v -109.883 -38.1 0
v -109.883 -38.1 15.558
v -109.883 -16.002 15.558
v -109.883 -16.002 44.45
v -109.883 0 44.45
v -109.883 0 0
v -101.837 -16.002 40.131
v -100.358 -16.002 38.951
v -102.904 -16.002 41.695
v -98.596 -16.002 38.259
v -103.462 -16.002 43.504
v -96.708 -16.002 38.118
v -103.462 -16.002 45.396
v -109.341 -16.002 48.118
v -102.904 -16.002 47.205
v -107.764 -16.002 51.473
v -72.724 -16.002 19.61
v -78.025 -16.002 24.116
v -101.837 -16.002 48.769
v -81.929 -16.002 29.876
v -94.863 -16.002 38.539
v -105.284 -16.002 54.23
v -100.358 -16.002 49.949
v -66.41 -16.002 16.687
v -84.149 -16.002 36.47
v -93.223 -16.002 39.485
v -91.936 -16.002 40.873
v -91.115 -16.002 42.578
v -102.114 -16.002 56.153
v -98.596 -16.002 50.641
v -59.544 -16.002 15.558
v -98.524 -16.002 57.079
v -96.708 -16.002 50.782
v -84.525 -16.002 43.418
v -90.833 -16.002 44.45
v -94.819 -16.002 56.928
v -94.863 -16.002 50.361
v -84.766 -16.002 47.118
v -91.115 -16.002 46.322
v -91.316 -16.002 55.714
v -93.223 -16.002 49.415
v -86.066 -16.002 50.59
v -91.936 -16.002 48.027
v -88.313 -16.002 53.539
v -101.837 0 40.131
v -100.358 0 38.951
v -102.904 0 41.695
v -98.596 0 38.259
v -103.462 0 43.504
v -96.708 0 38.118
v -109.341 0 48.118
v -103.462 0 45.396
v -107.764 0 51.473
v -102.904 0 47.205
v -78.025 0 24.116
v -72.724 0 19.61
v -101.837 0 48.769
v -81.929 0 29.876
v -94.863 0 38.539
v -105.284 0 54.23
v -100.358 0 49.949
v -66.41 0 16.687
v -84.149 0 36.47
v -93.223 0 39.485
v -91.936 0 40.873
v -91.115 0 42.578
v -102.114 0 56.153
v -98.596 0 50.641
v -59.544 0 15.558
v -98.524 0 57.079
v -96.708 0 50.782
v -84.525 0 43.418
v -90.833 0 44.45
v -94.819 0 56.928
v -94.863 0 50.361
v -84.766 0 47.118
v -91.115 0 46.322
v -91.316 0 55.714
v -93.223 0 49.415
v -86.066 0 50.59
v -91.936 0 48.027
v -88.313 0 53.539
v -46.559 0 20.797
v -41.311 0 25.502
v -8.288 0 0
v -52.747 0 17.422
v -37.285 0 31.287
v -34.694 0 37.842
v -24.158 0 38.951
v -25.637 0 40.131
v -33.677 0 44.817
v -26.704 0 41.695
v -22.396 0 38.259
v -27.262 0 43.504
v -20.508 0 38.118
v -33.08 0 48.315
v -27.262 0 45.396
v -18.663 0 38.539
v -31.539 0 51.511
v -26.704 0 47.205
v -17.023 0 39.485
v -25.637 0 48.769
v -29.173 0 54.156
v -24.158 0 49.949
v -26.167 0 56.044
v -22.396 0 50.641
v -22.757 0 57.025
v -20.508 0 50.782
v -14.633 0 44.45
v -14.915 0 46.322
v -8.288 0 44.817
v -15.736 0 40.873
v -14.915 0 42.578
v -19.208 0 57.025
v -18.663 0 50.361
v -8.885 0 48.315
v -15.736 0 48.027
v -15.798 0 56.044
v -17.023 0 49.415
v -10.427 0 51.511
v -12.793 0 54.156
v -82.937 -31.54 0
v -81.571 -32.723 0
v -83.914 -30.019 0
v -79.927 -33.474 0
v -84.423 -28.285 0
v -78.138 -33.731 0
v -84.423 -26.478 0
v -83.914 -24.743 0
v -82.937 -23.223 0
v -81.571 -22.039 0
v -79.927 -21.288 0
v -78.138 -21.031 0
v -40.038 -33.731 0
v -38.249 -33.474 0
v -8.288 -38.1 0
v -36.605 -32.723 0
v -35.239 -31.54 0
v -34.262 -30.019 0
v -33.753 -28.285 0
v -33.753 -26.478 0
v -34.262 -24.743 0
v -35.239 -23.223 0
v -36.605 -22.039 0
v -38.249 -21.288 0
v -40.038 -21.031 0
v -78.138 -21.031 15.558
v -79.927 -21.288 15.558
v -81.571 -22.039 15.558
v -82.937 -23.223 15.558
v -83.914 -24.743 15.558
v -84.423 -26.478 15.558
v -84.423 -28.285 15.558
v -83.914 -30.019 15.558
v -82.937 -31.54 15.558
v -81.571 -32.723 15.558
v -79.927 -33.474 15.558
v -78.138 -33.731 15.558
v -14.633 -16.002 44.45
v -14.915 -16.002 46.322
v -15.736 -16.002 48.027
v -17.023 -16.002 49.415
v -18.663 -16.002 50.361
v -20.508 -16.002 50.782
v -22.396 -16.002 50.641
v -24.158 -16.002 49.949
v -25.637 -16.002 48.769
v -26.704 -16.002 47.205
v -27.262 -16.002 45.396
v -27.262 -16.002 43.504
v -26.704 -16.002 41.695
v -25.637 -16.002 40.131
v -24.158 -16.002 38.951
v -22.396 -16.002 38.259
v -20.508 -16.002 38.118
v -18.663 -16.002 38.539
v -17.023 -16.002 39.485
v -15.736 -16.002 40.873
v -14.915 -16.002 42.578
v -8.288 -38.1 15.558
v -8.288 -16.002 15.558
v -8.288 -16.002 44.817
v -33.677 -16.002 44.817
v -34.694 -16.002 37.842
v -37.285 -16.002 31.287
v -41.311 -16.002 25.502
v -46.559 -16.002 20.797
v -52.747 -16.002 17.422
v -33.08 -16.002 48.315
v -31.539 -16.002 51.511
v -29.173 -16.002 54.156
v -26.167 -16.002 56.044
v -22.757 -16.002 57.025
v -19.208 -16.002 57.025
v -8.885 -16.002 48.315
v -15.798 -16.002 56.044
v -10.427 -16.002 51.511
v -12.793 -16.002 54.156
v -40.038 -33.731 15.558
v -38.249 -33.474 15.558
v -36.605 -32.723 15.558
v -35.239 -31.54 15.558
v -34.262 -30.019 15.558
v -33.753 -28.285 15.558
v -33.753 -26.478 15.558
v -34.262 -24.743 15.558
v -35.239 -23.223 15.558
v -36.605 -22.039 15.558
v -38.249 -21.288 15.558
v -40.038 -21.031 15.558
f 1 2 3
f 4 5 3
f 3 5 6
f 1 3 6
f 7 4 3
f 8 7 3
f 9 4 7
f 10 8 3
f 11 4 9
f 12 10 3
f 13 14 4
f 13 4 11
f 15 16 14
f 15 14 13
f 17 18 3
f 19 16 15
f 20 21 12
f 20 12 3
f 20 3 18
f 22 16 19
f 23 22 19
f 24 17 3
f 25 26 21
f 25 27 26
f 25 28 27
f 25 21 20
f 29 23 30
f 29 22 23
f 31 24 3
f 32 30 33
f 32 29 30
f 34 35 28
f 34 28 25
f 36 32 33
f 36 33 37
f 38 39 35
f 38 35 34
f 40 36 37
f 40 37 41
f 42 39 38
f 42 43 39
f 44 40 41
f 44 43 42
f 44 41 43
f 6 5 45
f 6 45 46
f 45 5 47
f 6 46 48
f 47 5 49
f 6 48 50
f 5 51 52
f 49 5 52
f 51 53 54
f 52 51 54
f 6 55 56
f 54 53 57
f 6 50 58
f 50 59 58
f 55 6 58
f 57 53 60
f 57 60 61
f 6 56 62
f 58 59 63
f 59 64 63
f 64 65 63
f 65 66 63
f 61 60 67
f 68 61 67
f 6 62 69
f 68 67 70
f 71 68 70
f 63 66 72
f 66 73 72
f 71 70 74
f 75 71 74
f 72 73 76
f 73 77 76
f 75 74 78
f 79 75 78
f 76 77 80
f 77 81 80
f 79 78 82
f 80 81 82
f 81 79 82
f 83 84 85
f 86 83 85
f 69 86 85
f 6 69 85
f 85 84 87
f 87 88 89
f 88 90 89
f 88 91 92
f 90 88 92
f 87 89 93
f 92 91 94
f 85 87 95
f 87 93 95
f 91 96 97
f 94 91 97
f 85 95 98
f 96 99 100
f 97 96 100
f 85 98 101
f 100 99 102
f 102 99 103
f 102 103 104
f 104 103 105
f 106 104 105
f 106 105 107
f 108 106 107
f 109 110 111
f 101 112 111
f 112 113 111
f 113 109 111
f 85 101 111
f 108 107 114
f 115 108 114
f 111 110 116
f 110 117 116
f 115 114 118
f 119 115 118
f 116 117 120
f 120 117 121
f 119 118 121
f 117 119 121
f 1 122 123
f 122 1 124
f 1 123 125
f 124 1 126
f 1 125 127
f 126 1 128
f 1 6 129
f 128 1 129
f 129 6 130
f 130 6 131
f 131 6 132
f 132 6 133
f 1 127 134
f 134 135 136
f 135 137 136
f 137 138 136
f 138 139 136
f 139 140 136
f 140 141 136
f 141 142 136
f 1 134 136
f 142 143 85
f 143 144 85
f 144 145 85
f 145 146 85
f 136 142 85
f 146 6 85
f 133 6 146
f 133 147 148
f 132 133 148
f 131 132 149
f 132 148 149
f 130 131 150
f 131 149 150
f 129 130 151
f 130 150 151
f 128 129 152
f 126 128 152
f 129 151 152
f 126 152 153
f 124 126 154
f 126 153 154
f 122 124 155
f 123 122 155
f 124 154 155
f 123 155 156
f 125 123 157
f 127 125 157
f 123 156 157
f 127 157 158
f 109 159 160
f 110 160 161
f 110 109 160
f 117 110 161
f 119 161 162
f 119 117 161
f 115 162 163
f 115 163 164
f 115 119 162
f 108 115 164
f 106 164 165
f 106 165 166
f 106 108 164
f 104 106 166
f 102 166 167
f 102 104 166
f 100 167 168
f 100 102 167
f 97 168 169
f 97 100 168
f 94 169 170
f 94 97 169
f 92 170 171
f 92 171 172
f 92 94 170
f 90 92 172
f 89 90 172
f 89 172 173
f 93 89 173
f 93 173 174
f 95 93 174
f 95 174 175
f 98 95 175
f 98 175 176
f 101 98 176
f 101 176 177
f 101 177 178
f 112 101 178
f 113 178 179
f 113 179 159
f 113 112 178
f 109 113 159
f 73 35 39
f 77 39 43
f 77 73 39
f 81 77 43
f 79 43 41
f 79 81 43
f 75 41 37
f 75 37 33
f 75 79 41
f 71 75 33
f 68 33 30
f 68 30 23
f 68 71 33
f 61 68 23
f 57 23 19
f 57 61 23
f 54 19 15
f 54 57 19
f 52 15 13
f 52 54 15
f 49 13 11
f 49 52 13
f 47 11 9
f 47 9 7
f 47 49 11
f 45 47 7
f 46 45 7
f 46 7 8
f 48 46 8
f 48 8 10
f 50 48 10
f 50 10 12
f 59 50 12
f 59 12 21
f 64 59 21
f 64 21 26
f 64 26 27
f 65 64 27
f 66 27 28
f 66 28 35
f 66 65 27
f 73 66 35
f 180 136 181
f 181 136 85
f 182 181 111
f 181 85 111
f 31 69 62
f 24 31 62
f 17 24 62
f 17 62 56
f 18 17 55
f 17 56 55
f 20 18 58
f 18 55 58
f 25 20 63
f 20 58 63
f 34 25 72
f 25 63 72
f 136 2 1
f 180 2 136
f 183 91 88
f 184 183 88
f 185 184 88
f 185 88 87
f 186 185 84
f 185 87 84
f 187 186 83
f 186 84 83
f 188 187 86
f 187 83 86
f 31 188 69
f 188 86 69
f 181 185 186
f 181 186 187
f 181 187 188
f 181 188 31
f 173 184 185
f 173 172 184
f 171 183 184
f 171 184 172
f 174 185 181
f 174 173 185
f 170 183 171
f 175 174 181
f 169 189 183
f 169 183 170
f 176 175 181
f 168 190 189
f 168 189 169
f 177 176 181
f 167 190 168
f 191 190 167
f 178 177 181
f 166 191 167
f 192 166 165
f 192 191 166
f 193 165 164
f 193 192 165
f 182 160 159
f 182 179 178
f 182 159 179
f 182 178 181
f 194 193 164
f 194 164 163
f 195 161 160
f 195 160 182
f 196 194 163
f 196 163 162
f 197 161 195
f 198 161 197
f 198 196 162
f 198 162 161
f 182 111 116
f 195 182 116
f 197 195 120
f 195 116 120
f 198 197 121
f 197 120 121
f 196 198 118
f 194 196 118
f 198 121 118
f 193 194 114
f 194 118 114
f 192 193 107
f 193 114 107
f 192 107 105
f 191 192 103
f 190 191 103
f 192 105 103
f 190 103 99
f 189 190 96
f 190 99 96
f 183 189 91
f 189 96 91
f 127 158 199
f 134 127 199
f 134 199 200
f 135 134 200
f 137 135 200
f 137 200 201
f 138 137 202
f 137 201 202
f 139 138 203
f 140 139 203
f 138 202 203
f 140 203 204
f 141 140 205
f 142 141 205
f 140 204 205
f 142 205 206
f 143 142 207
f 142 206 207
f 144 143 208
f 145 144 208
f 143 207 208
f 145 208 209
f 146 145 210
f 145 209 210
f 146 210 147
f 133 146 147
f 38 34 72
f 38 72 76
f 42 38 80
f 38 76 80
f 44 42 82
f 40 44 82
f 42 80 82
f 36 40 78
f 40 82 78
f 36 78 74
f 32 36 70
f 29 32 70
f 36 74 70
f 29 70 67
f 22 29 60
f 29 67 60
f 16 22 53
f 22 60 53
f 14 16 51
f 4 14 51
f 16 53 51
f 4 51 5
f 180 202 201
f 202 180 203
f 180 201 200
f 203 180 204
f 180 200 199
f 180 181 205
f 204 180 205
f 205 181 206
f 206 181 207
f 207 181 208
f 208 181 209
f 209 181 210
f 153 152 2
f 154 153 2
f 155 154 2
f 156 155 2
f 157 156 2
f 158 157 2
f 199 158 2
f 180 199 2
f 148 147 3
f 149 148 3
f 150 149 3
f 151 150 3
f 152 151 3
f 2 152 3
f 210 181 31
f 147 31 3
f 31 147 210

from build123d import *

# Parameters (mm, degrees)
F0_R     = 6.35
F1_DEPTH = 16.002
F2_DEPTH = 38.1
F4_DEPTH = 25.4


with BuildPart() as f1:
    # F0 (on Front) → F1 (new body)
    with BuildSketch(Plane.XZ):
        with BuildLine():
            Line((-109.882609, 44.45), (-109.882609, 15.558309))
            Line((-109.882609, 15.558309), (-59.544396, 15.558309))
            ThreePointArc((-59.544396, 15.558309), (-78.025435, 24.116231), (-84.524632, 43.417714))
            ThreePointArc((-84.524632, 43.417714), (-96.666039, 57.13949), (-109.882609, 44.45))
        make_face()
        with Locations((-97.182609, 44.45)):
            Circle(F0_R, mode=Mode.SUBTRACT)
        with BuildLine():
            Line((-59.544396, 15.558309), (-8.287901, 15.558309))
            Line((-8.287901, 15.558309), (-8.287901, 44.816575))
            ThreePointArc((-8.287901, 44.816575), (-20.982609, 57.15), (-33.677318, 44.816575))
            ThreePointArc((-33.677318, 44.816575), (-41.311473, 25.502285), (-59.544396, 15.558309))
        make_face()
        with Locations((-20.982609, 44.45)):
            Circle(F0_R, mode=Mode.SUBTRACT)
    extrude(amount=F1_DEPTH)

    # F0 (on Front) → F2 (join)
    with BuildSketch(Plane.XZ):
        Polygon((-109.882609, 15.558309), (-109.882609, 0), (-8.287901, 0), (-8.287901, 15.558309), (-59.544396, 15.558309), align=None)
    extrude(amount=F2_DEPTH)

    # F3 (on face) → F4 (cut)
    with BuildSketch(Plane.XY.offset(15.558309)):
        with BuildLine():
            Line((-40.037901, -21.03122), (-78.137901, -21.03122))
            ThreePointArc((-78.137901, -21.03122), (-84.487901, -27.38122), (-78.137901, -33.73122))
            Line((-78.137901, -33.73122), (-40.037901, -33.73122))
            ThreePointArc((-40.037901, -33.73122), (-33.687901, -27.38122), (-40.037901, -21.03122))
        make_face()
    extrude(amount=-F4_DEPTH, mode=Mode.SUBTRACT)


solid = f1.part
